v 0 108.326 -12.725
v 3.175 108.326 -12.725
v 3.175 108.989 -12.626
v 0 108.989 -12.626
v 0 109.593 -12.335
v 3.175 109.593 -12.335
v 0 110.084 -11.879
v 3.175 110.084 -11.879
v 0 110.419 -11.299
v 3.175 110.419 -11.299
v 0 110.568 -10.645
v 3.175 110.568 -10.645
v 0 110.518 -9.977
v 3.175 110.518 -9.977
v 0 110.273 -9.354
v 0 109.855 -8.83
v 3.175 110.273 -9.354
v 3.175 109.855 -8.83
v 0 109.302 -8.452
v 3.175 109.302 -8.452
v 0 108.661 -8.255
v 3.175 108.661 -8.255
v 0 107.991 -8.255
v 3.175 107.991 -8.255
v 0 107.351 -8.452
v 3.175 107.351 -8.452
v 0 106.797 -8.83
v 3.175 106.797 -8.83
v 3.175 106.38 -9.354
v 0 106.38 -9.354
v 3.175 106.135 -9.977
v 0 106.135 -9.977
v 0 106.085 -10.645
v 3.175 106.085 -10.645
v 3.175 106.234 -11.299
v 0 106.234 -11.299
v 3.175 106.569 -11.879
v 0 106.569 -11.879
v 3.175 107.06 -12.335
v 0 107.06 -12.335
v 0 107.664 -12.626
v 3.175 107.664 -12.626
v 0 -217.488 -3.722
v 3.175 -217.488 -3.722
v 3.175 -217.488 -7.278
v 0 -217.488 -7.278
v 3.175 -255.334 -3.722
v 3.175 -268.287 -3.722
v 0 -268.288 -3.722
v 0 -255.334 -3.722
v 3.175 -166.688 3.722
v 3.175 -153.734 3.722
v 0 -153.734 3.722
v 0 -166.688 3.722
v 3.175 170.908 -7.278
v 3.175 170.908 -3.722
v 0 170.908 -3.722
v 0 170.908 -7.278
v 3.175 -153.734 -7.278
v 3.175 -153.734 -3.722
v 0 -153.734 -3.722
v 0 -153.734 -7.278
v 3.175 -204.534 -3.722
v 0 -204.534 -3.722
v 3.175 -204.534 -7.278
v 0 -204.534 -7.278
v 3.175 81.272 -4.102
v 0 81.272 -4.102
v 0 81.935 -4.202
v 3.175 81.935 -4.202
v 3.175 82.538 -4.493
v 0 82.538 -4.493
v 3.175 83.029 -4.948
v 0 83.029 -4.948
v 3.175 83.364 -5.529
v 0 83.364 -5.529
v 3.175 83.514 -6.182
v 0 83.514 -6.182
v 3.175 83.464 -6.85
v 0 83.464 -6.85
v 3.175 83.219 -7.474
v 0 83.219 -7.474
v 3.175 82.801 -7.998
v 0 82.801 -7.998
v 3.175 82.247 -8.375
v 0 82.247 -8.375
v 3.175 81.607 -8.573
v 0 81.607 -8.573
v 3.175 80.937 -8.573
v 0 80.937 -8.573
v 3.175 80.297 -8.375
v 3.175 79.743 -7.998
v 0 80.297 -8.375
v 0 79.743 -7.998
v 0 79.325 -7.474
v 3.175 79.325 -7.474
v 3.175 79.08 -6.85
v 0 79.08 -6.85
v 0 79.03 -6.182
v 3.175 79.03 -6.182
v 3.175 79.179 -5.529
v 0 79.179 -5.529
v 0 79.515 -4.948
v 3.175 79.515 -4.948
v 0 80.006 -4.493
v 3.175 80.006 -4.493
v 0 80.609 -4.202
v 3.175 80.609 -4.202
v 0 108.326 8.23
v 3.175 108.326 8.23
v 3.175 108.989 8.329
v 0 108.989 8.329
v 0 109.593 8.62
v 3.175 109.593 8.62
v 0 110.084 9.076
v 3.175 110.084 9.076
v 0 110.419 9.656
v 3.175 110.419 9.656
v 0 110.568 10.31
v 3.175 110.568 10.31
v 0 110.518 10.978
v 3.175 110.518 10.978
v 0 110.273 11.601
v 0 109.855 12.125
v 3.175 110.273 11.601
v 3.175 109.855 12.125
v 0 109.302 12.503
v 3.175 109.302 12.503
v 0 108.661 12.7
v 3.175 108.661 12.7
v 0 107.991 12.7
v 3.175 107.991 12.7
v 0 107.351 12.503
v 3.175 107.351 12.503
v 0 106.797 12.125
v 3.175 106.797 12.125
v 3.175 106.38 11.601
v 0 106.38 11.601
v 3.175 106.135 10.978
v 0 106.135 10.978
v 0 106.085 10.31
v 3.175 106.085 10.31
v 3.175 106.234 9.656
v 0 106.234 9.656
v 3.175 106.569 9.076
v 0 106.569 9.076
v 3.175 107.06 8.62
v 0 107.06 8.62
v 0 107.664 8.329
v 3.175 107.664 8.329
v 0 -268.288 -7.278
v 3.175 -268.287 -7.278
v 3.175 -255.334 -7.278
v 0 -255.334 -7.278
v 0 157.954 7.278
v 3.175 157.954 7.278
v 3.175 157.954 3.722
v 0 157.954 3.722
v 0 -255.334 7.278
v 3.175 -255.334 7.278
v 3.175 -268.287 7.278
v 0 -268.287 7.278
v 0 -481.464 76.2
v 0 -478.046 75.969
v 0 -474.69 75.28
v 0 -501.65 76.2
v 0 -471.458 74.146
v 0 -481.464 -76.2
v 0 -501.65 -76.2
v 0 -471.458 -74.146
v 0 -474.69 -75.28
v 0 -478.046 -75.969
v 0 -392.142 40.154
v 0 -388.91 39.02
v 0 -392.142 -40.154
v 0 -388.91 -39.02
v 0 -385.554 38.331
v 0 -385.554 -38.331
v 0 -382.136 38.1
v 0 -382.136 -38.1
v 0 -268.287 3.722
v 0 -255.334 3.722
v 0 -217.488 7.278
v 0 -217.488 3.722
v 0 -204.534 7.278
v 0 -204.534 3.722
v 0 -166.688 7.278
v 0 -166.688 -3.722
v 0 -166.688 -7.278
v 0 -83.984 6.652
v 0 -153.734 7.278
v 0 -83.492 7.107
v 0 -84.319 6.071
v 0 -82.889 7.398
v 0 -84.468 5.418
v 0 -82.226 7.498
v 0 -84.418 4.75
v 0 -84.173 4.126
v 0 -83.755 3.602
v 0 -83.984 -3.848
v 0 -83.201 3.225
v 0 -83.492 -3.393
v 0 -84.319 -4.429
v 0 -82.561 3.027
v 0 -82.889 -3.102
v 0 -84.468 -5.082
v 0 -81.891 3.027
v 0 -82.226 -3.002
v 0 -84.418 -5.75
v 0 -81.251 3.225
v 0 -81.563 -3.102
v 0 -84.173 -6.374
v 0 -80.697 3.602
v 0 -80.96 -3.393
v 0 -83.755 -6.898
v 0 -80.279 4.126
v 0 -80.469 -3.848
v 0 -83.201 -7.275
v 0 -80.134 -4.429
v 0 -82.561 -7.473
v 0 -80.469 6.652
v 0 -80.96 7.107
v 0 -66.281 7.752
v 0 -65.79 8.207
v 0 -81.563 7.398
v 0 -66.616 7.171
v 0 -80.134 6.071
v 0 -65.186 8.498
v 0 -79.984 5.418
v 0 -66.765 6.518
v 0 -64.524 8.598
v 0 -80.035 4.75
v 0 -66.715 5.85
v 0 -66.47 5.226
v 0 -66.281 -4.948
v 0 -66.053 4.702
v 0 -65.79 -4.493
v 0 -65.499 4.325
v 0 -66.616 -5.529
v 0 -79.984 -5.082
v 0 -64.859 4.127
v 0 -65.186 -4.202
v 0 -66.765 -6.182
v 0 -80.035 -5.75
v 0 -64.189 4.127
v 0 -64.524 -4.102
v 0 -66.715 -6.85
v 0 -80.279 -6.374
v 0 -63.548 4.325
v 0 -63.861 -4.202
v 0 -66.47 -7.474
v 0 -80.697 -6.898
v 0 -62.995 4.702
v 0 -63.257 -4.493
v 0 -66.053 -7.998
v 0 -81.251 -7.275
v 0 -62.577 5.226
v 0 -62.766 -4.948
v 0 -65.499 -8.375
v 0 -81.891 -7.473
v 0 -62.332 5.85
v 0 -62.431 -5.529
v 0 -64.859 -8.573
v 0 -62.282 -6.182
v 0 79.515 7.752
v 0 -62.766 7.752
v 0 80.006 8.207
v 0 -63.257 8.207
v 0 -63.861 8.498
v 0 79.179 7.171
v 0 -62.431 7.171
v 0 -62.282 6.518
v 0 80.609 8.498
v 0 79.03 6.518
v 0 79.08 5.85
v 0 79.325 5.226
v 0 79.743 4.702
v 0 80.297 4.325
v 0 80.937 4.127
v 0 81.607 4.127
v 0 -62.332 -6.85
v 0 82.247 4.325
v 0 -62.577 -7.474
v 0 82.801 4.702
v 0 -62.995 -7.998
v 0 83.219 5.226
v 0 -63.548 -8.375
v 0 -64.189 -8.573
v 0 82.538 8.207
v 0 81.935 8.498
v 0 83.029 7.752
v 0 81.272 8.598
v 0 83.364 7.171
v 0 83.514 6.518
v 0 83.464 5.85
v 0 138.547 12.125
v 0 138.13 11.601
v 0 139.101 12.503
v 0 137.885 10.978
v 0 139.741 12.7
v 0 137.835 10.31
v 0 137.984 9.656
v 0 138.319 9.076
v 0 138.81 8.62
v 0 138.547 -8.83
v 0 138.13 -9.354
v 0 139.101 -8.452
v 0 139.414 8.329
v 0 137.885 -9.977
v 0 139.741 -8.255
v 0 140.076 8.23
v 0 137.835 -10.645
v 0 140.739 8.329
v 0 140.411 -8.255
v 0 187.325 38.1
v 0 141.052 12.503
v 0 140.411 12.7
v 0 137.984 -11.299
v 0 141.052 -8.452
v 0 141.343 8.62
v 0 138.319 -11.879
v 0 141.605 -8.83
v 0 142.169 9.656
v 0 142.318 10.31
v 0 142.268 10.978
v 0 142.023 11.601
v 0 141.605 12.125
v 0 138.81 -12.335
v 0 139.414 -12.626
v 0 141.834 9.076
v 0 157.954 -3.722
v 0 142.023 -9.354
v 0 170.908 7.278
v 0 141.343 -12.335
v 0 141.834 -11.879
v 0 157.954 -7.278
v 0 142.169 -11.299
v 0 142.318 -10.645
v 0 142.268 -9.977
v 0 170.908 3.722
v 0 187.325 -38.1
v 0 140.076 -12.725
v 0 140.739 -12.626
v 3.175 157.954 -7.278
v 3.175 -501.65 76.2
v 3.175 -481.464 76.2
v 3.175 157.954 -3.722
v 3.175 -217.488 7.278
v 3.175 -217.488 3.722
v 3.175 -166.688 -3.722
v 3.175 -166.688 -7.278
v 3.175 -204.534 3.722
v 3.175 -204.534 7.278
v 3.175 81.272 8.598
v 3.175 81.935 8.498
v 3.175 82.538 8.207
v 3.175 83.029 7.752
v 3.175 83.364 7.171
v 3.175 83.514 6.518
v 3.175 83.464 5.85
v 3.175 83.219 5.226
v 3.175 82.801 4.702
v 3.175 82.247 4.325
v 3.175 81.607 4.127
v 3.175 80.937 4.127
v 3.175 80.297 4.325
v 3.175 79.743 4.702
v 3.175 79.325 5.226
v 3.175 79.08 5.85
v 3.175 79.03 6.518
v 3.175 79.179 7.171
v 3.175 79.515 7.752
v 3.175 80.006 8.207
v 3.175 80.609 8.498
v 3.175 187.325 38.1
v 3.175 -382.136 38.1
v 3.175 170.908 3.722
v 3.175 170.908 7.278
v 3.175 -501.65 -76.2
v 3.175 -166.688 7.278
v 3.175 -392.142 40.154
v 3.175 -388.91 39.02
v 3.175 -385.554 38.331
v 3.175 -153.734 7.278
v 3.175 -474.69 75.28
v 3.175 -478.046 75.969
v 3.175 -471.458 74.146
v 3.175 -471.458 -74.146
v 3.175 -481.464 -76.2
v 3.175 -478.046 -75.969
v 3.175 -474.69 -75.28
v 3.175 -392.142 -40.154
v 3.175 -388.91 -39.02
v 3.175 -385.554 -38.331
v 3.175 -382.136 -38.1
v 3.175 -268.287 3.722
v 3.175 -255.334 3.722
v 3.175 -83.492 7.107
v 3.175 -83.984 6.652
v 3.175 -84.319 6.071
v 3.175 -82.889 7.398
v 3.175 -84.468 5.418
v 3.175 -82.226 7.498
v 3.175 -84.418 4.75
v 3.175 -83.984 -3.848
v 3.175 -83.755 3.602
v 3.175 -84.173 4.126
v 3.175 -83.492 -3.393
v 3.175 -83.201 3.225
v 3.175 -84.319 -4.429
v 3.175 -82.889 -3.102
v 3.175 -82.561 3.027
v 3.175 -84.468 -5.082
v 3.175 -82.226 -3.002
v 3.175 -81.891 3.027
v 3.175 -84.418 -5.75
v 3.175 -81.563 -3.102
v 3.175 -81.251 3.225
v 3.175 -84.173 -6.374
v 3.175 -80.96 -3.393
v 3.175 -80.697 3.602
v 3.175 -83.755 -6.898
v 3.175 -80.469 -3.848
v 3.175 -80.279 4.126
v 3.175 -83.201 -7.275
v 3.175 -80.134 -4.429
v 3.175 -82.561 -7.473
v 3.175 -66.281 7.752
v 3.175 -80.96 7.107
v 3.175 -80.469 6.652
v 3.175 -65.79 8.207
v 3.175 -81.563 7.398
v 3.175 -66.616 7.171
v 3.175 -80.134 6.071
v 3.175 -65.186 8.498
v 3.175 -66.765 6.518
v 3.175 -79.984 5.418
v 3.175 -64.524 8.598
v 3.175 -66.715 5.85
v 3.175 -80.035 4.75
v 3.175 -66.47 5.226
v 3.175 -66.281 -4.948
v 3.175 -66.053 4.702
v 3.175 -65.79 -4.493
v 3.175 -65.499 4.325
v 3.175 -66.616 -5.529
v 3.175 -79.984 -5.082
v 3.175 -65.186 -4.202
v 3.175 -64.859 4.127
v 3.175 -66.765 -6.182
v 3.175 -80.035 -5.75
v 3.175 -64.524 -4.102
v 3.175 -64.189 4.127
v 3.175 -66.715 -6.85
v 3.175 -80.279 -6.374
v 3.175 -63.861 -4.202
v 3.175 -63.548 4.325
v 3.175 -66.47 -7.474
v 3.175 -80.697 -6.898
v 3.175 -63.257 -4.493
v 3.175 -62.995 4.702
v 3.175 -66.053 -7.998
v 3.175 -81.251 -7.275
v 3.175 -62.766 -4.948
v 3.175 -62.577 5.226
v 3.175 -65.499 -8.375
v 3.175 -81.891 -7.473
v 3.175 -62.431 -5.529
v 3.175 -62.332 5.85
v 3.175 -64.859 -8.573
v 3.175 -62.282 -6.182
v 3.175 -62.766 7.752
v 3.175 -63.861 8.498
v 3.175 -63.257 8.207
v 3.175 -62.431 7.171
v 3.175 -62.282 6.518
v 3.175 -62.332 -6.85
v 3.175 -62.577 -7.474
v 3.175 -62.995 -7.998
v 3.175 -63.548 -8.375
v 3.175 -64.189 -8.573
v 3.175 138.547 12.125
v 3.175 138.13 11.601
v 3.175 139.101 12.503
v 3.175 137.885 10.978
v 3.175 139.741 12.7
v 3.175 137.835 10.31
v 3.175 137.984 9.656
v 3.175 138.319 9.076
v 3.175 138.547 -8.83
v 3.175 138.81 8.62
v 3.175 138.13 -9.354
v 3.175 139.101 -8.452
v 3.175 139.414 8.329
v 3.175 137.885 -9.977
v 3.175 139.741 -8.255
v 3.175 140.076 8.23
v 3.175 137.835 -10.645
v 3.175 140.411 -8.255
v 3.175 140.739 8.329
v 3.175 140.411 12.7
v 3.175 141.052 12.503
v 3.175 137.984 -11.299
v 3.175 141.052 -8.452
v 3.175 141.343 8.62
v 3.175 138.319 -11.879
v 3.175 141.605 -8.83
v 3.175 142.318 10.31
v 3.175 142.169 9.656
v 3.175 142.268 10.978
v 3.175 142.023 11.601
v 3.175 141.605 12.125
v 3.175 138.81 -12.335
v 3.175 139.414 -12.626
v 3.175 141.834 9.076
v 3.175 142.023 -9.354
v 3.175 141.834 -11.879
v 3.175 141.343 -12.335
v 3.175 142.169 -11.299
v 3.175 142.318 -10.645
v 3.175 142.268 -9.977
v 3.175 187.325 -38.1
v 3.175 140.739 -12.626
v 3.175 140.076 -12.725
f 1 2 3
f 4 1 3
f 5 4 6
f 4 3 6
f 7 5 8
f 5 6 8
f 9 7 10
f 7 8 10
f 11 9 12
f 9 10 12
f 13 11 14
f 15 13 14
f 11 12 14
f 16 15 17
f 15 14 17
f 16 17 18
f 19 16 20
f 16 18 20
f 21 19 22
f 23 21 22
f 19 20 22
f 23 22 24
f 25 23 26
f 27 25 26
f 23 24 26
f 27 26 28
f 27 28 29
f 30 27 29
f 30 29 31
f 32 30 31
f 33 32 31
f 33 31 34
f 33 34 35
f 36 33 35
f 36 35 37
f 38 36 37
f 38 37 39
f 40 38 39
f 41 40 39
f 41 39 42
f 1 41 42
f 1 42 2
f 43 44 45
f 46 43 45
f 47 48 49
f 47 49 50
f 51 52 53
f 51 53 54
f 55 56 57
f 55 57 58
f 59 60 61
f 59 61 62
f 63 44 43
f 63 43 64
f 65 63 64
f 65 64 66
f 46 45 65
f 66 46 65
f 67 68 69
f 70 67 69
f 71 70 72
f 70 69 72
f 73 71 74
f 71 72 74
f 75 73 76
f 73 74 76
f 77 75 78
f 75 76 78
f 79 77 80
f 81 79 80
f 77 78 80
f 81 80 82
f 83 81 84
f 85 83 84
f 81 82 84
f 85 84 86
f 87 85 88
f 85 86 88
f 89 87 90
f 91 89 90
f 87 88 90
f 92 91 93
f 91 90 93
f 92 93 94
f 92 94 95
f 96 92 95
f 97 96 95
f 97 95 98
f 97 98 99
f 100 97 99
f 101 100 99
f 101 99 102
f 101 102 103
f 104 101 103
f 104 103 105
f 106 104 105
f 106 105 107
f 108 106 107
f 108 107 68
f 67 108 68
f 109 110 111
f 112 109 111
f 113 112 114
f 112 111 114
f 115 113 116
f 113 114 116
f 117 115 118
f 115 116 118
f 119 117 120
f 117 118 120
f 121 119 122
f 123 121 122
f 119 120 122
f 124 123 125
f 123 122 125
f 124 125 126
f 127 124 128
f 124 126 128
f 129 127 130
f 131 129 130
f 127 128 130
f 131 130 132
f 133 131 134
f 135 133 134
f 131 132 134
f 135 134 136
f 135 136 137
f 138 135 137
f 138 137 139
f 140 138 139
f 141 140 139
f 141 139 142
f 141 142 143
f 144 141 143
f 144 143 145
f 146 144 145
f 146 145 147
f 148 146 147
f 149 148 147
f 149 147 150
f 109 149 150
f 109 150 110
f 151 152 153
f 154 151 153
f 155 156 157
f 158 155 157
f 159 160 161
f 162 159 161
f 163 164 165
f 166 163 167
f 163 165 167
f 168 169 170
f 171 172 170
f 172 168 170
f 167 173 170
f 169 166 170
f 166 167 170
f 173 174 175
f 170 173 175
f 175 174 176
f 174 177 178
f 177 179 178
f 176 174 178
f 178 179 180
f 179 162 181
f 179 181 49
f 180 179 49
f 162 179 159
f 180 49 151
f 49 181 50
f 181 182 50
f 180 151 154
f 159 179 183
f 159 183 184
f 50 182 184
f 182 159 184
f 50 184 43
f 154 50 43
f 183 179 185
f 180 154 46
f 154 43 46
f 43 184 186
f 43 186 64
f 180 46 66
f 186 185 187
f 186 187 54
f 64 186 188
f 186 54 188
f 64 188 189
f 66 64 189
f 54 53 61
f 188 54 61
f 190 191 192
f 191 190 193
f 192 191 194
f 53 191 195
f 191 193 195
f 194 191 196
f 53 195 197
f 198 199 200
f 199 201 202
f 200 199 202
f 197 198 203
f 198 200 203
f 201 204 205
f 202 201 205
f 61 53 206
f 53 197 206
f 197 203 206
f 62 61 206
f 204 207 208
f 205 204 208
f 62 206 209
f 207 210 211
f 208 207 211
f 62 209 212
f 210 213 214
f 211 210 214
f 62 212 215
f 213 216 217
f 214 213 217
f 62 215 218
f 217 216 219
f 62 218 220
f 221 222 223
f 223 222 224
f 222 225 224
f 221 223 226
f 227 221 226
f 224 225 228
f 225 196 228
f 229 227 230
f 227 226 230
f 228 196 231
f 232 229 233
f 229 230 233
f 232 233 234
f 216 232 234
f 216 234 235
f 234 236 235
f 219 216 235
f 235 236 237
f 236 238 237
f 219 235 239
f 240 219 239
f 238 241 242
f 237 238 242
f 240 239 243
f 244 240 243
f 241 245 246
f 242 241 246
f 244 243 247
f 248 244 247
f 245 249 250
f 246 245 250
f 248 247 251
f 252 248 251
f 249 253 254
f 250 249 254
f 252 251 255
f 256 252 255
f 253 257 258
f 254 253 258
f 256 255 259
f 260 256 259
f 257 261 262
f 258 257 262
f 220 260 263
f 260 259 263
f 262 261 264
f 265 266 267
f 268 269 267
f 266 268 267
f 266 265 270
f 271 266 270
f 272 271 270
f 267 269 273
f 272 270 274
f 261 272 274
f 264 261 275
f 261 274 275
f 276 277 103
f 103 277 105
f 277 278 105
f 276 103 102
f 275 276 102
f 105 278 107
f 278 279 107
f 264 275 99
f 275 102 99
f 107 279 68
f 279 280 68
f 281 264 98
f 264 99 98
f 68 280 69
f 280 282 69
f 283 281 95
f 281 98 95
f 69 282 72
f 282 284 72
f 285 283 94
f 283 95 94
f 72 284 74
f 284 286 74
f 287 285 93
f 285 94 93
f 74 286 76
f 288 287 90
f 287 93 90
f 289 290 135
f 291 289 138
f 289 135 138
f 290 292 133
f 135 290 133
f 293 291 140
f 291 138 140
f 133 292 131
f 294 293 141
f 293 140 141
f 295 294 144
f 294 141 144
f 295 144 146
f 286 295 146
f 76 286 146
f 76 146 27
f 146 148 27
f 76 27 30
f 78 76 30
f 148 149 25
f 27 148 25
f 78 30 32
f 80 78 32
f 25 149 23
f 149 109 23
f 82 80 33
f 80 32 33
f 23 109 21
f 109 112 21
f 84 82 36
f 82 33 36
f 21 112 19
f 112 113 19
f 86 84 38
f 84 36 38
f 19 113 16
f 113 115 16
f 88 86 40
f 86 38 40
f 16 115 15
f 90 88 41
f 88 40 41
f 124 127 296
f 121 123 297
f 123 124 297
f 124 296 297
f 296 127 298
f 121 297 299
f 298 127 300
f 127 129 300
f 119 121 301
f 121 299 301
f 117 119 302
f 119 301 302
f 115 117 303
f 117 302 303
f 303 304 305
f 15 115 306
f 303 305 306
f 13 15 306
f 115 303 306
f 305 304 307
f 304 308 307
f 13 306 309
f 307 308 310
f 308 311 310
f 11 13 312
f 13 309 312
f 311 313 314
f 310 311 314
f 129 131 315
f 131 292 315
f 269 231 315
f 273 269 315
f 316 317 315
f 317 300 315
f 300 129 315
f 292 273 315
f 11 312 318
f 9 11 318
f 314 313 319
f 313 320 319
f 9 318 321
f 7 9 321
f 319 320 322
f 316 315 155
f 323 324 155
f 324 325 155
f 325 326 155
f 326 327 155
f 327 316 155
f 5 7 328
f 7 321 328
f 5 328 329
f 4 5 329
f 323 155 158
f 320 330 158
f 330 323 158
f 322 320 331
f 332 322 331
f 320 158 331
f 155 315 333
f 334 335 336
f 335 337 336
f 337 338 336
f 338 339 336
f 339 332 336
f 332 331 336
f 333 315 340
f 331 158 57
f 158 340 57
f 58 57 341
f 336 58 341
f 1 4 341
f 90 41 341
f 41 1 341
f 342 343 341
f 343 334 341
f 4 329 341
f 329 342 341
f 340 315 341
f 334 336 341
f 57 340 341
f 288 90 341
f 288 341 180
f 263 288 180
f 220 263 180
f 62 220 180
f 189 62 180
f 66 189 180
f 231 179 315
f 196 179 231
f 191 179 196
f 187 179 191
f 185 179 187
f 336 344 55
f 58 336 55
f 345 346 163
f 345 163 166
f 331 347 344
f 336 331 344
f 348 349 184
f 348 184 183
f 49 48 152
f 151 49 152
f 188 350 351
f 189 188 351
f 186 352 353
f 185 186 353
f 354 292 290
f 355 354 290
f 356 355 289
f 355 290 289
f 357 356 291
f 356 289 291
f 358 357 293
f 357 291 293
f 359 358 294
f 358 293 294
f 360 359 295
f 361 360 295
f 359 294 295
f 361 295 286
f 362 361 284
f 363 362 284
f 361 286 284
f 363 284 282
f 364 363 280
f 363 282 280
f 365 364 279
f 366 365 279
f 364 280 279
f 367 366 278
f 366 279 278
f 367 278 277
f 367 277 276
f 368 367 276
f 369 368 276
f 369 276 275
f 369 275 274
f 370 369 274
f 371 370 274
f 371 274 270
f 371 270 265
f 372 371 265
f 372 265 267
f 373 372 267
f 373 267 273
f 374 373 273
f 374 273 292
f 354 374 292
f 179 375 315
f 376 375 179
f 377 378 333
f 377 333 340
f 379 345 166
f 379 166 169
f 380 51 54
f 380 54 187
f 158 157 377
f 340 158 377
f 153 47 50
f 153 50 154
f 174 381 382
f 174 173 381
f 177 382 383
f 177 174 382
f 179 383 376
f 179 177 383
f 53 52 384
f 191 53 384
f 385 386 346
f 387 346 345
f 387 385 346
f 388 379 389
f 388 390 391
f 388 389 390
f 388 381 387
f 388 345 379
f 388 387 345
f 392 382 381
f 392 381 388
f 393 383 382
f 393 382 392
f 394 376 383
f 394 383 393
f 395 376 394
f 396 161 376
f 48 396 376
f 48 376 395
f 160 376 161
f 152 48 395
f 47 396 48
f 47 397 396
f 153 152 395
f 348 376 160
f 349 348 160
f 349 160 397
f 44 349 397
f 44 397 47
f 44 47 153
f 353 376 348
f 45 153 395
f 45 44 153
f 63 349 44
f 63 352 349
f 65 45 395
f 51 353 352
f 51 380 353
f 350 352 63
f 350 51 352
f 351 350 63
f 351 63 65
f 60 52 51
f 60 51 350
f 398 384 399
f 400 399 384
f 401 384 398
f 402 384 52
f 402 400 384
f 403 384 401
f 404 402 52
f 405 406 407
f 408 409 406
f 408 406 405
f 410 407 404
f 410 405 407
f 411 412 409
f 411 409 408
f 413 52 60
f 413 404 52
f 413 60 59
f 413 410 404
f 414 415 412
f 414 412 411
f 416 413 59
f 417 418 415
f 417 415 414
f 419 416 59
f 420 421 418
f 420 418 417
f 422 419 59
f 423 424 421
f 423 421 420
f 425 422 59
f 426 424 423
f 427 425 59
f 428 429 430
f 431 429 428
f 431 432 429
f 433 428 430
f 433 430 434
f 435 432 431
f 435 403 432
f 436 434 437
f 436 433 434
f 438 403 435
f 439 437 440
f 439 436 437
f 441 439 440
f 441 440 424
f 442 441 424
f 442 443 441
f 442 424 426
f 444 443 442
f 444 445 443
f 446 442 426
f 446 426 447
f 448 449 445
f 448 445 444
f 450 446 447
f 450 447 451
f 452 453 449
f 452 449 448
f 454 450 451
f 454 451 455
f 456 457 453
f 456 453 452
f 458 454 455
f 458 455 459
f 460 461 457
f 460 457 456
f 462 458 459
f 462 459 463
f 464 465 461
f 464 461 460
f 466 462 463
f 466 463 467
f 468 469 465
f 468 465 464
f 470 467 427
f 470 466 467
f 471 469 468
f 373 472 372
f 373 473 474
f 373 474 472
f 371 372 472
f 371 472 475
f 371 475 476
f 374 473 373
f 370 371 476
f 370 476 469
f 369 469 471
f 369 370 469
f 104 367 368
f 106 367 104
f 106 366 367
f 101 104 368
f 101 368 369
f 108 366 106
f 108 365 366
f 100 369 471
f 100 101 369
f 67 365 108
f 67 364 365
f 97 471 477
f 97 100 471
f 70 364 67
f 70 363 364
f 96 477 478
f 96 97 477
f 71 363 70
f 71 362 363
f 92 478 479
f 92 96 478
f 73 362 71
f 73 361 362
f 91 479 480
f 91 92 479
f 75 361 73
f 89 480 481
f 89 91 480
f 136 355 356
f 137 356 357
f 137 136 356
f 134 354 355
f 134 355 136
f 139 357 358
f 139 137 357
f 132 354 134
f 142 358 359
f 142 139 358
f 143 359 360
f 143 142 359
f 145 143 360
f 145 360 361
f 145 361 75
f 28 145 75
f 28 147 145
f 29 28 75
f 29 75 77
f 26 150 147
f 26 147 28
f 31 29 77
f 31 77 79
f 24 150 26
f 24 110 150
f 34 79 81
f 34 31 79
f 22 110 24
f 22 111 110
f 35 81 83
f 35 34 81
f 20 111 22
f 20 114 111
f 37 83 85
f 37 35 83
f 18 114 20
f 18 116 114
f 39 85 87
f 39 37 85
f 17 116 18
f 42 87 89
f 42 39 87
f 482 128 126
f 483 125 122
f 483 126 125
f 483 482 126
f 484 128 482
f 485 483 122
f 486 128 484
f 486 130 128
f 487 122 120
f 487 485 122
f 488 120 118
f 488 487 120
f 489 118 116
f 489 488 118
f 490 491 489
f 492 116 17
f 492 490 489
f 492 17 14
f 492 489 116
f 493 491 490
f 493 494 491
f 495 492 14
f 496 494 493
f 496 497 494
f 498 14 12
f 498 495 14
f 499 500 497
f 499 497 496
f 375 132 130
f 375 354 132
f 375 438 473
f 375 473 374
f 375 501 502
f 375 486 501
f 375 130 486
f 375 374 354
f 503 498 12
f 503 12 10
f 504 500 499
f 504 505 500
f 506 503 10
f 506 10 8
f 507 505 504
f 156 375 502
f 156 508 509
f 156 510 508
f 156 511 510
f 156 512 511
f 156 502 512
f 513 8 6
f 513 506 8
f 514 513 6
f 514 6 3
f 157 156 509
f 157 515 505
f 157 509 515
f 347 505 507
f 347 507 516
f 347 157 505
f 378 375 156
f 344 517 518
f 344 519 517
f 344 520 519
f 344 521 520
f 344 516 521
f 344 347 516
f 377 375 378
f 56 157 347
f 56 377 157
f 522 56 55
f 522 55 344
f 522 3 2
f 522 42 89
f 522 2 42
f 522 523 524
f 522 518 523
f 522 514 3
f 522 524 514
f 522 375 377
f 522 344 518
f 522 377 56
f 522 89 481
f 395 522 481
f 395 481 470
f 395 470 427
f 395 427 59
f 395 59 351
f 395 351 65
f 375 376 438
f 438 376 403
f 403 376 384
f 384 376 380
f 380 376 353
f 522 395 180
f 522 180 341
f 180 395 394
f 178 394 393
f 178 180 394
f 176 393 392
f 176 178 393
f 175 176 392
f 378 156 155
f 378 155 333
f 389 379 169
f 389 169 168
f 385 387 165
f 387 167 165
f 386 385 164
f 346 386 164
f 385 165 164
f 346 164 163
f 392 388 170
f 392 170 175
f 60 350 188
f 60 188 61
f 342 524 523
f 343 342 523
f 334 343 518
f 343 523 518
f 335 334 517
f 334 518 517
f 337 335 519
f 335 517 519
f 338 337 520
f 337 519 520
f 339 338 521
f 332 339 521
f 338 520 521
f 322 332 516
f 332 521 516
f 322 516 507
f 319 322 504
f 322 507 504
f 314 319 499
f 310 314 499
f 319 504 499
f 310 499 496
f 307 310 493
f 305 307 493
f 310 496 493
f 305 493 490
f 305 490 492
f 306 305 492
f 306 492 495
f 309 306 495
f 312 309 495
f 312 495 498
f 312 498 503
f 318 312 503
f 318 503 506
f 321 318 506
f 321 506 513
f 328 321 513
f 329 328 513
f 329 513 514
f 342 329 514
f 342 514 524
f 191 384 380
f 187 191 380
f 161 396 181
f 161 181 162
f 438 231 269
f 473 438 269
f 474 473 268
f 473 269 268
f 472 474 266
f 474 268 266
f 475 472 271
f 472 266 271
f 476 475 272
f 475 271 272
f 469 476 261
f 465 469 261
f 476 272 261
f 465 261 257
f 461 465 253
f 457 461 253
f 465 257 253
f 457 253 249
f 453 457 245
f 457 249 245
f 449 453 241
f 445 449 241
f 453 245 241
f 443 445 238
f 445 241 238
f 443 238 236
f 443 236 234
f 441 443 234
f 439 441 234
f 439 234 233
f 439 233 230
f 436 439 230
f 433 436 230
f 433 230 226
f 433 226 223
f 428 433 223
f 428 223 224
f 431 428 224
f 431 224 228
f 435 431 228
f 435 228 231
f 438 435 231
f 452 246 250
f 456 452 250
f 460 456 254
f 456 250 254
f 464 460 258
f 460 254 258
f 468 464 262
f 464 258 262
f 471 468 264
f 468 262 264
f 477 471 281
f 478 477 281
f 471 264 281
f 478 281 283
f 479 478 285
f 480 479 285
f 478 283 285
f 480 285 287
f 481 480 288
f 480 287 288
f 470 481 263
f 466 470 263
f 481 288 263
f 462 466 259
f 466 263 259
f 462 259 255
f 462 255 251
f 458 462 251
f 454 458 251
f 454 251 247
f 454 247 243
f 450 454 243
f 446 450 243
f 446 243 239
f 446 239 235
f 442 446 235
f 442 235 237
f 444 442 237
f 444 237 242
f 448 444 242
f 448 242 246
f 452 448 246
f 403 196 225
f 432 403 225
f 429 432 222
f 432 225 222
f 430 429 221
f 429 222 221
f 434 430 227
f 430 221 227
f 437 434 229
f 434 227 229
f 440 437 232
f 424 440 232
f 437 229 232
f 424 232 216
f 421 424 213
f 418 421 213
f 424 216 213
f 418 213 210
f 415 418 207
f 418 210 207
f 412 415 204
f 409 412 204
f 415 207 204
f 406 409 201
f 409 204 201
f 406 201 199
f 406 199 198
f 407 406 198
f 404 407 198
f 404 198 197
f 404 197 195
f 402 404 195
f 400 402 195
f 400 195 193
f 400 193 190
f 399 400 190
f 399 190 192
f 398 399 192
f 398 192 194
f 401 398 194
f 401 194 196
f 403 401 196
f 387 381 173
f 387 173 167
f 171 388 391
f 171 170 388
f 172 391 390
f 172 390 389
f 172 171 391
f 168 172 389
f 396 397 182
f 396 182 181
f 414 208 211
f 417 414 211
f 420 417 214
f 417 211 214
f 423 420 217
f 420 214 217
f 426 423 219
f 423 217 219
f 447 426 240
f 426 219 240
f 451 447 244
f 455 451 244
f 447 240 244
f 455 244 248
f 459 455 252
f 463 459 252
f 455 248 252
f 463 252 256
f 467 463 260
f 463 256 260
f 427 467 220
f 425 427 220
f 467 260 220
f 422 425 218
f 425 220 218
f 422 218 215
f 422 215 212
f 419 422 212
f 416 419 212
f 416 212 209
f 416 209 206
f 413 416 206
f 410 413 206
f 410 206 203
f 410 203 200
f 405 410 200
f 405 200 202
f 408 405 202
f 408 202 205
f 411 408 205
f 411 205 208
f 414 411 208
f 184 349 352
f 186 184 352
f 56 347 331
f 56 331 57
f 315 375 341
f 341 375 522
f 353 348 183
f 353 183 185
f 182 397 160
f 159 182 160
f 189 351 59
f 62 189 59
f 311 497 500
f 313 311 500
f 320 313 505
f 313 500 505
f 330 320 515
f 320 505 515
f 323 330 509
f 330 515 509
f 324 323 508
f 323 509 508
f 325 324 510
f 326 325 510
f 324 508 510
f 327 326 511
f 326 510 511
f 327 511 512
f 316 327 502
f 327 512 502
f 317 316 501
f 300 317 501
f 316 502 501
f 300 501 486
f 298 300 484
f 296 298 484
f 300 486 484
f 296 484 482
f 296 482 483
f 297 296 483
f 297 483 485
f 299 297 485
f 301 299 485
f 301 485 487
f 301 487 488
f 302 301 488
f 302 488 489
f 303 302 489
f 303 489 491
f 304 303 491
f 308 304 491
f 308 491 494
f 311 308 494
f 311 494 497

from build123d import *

# Parameters (mm, degrees)
SKETCH1_W                     = 76.2
SKETCH1_H                     = 914.4
BOSS_EXTRUDE1_DEPTH           = 3.175
SKETCH2_W                     = 3.556
SKETCH2_H                     = 12.954
CUT_EXTRUDE1_DEPTH            = 4.175
LPATTERN1_COUNT               = 2
LPATTERN1_PITCH               = 50.8
LPATTERN1_COPY_1_SKETCH_W     = 3.556
LPATTERN1_COPY_1_SKETCH_H     = 12.954
LPATTERN1_COPY_1_DEPTH        = 4.175
LPATTERN1_COL_COUNT           = 2
LPATTERN1_COL_PITCH           = 50.8
LPATTERN1_COL_COPY_1_SKETCH_W = 3.556
LPATTERN1_COL_COPY_1_SKETCH_H = 12.954
LPATTERN1_COL_COPY_1_DEPTH    = 4.175
SKETCH3_W                     = 3.556
SKETCH3_H                     = 12.954
CUT_EXTRUDE2_DEPTH            = 4.175
F_8_CLEARANCE_HOLE1_D         = 4.4958
CUT_EXTRUDE3_DEPTH            = 1
CUT_EXTRUDE3_DEPTH_BACK       = 4.175
BOSS_EXTRUDE2_DEPTH           = 3.175
BOSS_EXTRUDE3_DEPTH           = 3.175
FILLET1_R                     = 25.4
F_8_CLEARANCE_HOLE2_D         = 4.4958


with BuildPart() as part:
    # Sketch1 → Boss-Extrude1 (new body)
    with BuildSketch(Plane(origin=(0, 0, 0), x_dir=(0, 0, -1), z_dir=(1, 0, 0))):
        Rectangle(SKETCH1_W, SKETCH1_H)
    extrude(amount=BOSS_EXTRUDE1_DEPTH)

    # Sketch2 → Cut-Extrude1 (cut, through all)
    with BuildSketch(Plane(origin=(3.175, 0, 0), x_dir=(0, 0, -1), z_dir=(1, 0, 0))):
        with Locations((5.499997, -211.0105)):
            Rectangle(SKETCH2_W, SKETCH2_H)
    cut_extrude1 = extrude(amount=-CUT_EXTRUDE1_DEPTH, mode=Mode.SUBTRACT)

    # Mirror1: Cut-Extrude1 across plane
    add(cut_extrude1.mirror(Plane.XY), mode=Mode.SUBTRACT)

    # LPattern1: Cut-Extrude1 ×2
    with Locations(*[(0, i * LPATTERN1_PITCH, 0) for i in range(1, LPATTERN1_COUNT)]):
        add(cut_extrude1, mode=Mode.SUBTRACT)

    # LPattern1 copy 1 sketch → LPattern1 copy 1 (cut, through all)
    with BuildSketch(Plane(origin=(3.175, 50.8, 0), x_dir=(0, 0, 1), z_dir=(1, 0, 0))):
        with Locations((5.499997, 211.0105)):
            Rectangle(LPATTERN1_COPY_1_SKETCH_W, LPATTERN1_COPY_1_SKETCH_H)
    extrude(amount=-LPATTERN1_COPY_1_DEPTH, mode=Mode.SUBTRACT)

    # LPattern1 col: Cut-Extrude1 ×2
    with Locations(*[(0, -i * LPATTERN1_COL_PITCH, 0) for i in range(1, LPATTERN1_COL_COUNT)]):
        add(cut_extrude1, mode=Mode.SUBTRACT)

    # LPattern1 col copy 1 sketch → LPattern1 col copy 1 (cut, through all)
    with BuildSketch(Plane(origin=(3.175, -50.8, 0), x_dir=(0, 0, 1), z_dir=(1, 0, 0))):
        with Locations((5.499997, 211.0105)):
            Rectangle(LPATTERN1_COL_COPY_1_SKETCH_W, LPATTERN1_COL_COPY_1_SKETCH_H)
    extrude(amount=-LPATTERN1_COL_COPY_1_DEPTH, mode=Mode.SUBTRACT)

    # Sketch3 → Cut-Extrude2 (cut, through all)
    with BuildSketch(Plane(origin=(3.175, 0, 0), x_dir=(0, 0, -1), z_dir=(1, 0, 0))):
        with Locations((5.499997, 164.431090402)):
            Rectangle(SKETCH3_W, SKETCH3_H)
        with Locations((-5.499997, 164.431090402)):
            Rectangle(SKETCH3_W, SKETCH3_H)
    extrude(amount=-CUT_EXTRUDE2_DEPTH, mode=Mode.SUBTRACT)

    # #8 Clearance Hole1 (through all)
    with Locations(Plane(origin=(3.175, 0, 0), x_dir=(0, 0, -1), z_dir=(1, 0, 0))):
        with Locations((6.35, -64.523692353), (-6.35, -64.523692353), (6.35, 81.271985669), (-6.35, 81.271985669), (5.25, -82.226052879), (-5.25, -82.226052879)):
            Hole(F_8_CLEARANCE_HOLE1_D / 2)

    # Sketch6 → Cut-Extrude3 (cut, two sides)
    with BuildSketch(Plane(origin=(3.175, 0, 0), x_dir=(0, 0, -1), z_dir=(1, 0, 0))) as cut_extrude3_sk:
        Polygon((-1346.127604676, 187.325), (-38.1, 187.325), (38.1, 187.325), (1346.127604676, 187.325), (1346.127604676, 2803.380209351), (-1346.127604676, 2803.380209351), align=None)
    extrude(amount=CUT_EXTRUDE3_DEPTH, mode=Mode.SUBTRACT)
    extrude(cut_extrude3_sk.sketch, amount=-CUT_EXTRUDE3_DEPTH_BACK, mode=Mode.SUBTRACT)

    # Sketch7 → Boss-Extrude2 (add)
    with BuildSketch(Plane(origin=(3.175, 0, 0), x_dir=(0, 0, -1), z_dir=(1, 0, 0))):
        Polygon((-38.1, -457.2), (-38.1, -501.65), (0, -501.65), (38.1, -501.65), (38.1, -457.2), align=None)
    extrude(amount=-BOSS_EXTRUDE2_DEPTH)

    # Sketch8 → Boss-Extrude3 (add)
    with BuildSketch(Plane(origin=(3.175, 0, 0), x_dir=(0, 0, -1), z_dir=(1, 0, 0))):
        Polygon((-38.1, -387.35), (-76.2, -476.25), (-76.2, -501.65), (76.2, -501.65), (76.2, -476.25), (38.1, -387.35), align=None)
    extrude(amount=-BOSS_EXTRUDE3_DEPTH)

    # Fillet1
    fillet1_edges = [part.edges().sort_by_distance(p)[0] for p in [
        (1.5875, -387.35, 38.1),
        (1.5875, -387.35, -38.1),
        (1.5875, -476.25, -76.2),
        (1.5875, -476.25, 76.2),
    ]]
    fillet(fillet1_edges, radius=FILLET1_R)

    # #8 Clearance Hole2 (through all)
    with Locations(Plane.ZY):
        with Locations((10.4775, 108.326326852), (-10.4775, 108.326326852), (-10.4775, 140.076326852), (10.4775, 140.076326852)):
            Hole(F_8_CLEARANCE_HOLE2_D / 2)


solid = part.part
